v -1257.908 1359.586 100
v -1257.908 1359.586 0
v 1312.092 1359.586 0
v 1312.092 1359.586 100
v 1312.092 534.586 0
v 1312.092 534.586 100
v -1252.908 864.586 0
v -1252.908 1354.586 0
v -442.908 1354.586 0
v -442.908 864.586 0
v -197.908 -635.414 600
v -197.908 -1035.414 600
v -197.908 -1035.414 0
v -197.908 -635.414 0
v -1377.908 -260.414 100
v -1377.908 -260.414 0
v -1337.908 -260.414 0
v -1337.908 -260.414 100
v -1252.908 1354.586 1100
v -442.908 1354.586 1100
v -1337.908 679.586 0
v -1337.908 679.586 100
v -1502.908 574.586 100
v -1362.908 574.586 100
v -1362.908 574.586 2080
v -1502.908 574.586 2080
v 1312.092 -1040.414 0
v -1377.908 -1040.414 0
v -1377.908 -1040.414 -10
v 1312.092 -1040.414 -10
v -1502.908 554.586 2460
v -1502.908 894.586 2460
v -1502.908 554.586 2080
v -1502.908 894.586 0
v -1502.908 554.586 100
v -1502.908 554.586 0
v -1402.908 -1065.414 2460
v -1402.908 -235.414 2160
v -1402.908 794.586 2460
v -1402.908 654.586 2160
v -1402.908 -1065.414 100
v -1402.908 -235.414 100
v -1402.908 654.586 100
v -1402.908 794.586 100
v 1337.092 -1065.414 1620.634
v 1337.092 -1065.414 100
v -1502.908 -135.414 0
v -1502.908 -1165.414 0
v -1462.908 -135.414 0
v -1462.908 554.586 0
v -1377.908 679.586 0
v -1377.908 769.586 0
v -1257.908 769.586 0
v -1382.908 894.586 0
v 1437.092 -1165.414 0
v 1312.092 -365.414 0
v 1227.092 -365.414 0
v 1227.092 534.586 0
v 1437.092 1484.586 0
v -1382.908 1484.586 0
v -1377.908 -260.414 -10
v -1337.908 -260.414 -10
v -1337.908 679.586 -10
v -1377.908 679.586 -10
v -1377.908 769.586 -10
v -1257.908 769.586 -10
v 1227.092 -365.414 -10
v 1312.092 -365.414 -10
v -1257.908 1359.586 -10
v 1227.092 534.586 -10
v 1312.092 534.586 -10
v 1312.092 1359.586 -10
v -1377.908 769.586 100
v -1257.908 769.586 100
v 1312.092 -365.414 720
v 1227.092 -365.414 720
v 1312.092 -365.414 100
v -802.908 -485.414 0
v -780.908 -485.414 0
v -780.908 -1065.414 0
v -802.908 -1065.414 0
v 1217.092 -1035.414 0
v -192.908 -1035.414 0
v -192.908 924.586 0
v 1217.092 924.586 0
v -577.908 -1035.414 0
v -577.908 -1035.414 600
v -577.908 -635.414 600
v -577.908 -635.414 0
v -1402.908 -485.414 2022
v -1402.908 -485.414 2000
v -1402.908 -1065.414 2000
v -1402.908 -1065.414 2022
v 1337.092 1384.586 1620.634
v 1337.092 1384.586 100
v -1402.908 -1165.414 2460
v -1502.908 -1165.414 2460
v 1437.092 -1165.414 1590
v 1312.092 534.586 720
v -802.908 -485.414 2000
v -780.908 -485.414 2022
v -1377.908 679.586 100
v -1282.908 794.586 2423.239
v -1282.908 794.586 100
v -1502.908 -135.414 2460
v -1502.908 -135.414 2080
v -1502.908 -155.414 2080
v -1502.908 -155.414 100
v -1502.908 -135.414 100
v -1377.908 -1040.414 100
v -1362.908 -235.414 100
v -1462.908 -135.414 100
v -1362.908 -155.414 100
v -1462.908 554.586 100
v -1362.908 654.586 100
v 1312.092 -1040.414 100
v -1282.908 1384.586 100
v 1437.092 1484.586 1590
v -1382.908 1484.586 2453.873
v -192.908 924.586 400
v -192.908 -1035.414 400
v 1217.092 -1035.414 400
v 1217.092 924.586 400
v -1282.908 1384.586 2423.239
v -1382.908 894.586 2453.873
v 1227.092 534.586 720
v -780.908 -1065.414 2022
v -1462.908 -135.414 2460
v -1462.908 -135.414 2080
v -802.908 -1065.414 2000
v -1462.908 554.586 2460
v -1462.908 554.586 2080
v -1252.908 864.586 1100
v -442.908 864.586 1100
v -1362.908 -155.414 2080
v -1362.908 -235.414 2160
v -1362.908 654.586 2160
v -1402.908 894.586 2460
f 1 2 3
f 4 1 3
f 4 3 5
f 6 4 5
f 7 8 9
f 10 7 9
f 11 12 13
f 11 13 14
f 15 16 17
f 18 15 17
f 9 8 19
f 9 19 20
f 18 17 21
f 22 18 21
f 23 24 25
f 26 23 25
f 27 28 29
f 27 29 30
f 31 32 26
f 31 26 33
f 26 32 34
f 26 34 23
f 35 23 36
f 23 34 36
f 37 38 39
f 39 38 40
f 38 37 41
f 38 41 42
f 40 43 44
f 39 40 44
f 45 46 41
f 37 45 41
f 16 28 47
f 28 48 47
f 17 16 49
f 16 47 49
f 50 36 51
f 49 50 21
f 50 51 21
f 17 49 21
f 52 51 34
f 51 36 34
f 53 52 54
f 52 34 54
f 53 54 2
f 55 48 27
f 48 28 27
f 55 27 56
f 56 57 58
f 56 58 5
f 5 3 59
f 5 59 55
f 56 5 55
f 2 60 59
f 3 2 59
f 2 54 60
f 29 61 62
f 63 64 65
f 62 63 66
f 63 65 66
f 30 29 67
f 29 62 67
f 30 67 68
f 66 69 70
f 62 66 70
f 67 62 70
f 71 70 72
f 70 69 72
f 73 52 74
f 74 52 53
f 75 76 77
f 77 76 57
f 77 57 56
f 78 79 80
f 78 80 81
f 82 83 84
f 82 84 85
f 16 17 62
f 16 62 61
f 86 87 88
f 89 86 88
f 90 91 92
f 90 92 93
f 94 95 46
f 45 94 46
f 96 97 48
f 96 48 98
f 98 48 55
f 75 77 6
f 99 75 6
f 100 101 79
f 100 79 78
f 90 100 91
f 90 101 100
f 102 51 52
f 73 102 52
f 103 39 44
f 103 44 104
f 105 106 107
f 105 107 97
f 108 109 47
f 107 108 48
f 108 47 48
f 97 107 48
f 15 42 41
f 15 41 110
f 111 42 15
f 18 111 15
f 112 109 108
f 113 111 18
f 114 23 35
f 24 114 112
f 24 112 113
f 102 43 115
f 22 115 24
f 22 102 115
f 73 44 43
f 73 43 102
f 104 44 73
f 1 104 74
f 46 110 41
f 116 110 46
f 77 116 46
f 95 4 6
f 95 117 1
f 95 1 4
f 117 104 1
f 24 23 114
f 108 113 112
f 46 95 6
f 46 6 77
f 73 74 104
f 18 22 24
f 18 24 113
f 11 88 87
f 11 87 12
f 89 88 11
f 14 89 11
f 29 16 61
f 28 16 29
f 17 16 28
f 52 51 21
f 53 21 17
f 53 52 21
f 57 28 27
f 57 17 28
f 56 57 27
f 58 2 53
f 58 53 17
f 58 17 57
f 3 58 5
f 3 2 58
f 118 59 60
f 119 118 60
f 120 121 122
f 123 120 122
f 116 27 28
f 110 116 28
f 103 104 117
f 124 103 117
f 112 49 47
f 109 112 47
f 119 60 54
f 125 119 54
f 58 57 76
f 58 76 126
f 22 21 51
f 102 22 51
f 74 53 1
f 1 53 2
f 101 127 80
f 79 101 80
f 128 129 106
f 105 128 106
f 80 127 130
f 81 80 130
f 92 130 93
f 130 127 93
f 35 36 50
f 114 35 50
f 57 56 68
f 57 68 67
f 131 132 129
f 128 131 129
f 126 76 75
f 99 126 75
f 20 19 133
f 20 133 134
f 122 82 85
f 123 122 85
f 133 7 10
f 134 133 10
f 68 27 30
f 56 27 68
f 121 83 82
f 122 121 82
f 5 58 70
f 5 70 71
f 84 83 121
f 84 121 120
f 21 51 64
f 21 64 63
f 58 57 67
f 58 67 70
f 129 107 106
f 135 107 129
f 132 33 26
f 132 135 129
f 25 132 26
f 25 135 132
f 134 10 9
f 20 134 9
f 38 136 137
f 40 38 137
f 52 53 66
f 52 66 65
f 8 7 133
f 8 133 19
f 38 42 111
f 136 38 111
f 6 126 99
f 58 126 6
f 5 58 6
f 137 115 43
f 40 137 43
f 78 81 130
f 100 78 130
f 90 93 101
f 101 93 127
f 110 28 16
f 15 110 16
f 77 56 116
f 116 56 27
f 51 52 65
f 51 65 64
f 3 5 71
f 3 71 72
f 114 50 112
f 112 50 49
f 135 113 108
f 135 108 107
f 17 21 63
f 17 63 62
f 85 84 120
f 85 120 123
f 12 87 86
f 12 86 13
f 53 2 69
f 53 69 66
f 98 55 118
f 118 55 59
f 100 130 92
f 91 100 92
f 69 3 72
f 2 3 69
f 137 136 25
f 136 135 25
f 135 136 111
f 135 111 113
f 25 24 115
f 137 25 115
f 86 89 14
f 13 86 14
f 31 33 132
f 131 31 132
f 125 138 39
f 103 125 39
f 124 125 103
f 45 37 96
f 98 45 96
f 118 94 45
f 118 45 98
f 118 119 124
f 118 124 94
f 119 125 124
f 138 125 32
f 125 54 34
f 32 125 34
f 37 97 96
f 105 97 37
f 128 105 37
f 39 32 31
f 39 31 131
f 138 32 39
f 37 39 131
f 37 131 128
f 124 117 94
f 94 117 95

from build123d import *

# Parameters (mm, degrees)
F1_DEPTH      = 100
F2_DEPTH      = 2460
F0_W          = 85
F0_H          = 900
F3_DEPTH      = 720
F4_DEPTH      = 10
F6_DEPTH      = 1484.5868141508
F6_DEPTH_BACK = 1165.4151858492
F7_W          = 890
F7_H          = 300
F8_DEPTH      = 40
F9_W          = 730
F9_H          = 1980
F10_DEPTH     = 140.001
F12_W         = 810
F12_H         = 490
F13_DEPTH     = 1100
F12_W_2       = 1410
F12_H_2       = 1960
F14_DEPTH     = 400
F12_W_3       = 380
F12_H_3       = 400
F15_DEPTH     = 600
F17_DEPTH     = 580


with BuildPart() as f1:
    # F0 (on Top) → F1 (new body)
    with BuildSketch(Plane.XY):
        Polygon((1337.0921968033, 1384.5858141508), (-1282.9078031967, 1384.5858141508), (-1282.9078031967, 794.5858141508), (-1402.9078031967, 794.5858141508), (-1402.9078031967, 654.5858141508), (-1362.9078031967, 654.5858141508), (-1362.9078031967, -235.4141858492), (-1402.9078031967, -235.4141858492), (-1402.9078031967, -1065.4141858492), (1337.0921968033, -1065.4141858492), align=None)
        Polygon((-1377.9078031967, 769.5858141508), (-1257.9078031967, 769.5858141508), (-1257.9078031967, 1359.5858141508), (1312.0921968033, 1359.5858141508), (1312.0921968033, 534.5858141508), (1312.0921968033, -365.4141858492), (1312.0921968033, -1040.4141858492), (-1377.9078031967, -1040.4141858492), (-1377.9078031967, -260.4141858492), (-1337.9078031967, -260.4141858492), (-1337.9078031967, 679.5858141508), (-1377.9078031967, 679.5858141508), align=None, mode=Mode.SUBTRACT)
    extrude(amount=F1_DEPTH)

    # F0 (on Top) → F2 (join)
    with BuildSketch(Plane.XY):
        Polygon((-1502.9078031967, -135.4141858492), (-1502.9078031967, -1165.4141858492), (1437.0921968033, -1165.4141858492), (1437.0921968033, 1484.5858141508), (-1382.9078031967, 1484.5858141508), (-1382.9078031967, 894.5858141508), (-1502.9078031967, 894.5858141508), (-1502.9078031967, 554.5858141508), (-1462.9078031967, 554.5858141508), (-1462.9078031967, -135.4141858492), align=None)
        Polygon((-1282.9078031967, 794.5858141508), (-1282.9078031967, 1384.5858141508), (1337.0921968033, 1384.5858141508), (1337.0921968033, -1065.4141858492), (-1402.9078031967, -1065.4141858492), (-1402.9078031967, -235.4141858492), (-1362.9078031967, -235.4141858492), (-1362.9078031967, 654.5858141508), (-1402.9078031967, 654.5858141508), (-1402.9078031967, 794.5858141508), align=None, mode=Mode.SUBTRACT)
    extrude(amount=F2_DEPTH)

    # F0 (on Top) → F3 (join)
    with BuildSketch(Plane.XY):
        with Locations((1269.5921968033, 84.5858141508)):
            Rectangle(F0_W, F0_H)
    extrude(amount=F3_DEPTH)

    # F5 (on Front) → F6 (cut, two sides)
    with BuildSketch(Plane.XZ) as f6_sk:
        Polygon((1437.0921968033, 2460), (-1402.9078031967, 2460), (1437.0921968033, 1590), align=None)
    extrude(amount=-F6_DEPTH, mode=Mode.SUBTRACT)
    extrude(f6_sk.sketch, amount=F6_DEPTH_BACK, mode=Mode.SUBTRACT)

    # F7 (on face) → F8 (cut, through all)
    with BuildSketch(Plane.YZ.offset(-1362.9078031967)):
        with Locations((209.5858141508, 2310)):
            Rectangle(F7_W, F7_H)
    extrude(amount=-F8_DEPTH, mode=Mode.SUBTRACT)

    # F9 (on face) → F10 (cut, through all)
    with BuildSketch(Plane.YZ.offset(-1362.9078031967)):
        with Locations((209.5858141508, 1090)):
            Rectangle(F9_W, F9_H)
    extrude(amount=-F10_DEPTH, mode=Mode.SUBTRACT)


with BuildPart() as f4:
    # F0 (on Top) → F4 (new body)
    with BuildSketch(Plane.XY):
        Polygon((-1257.9078031967, 1359.5858141508), (-1257.9078031967, 769.5858141508), (-1377.9078031967, 769.5858141508), (-1377.9078031967, 679.5858141508), (-1337.9078031967, 679.5858141508), (-1337.9078031967, -260.4141858492), (-1377.9078031967, -260.4141858492), (-1377.9078031967, -1040.4141858492), (1312.0921968033, -1040.4141858492), (1312.0921968033, -365.4141858492), (1227.0921968033, -365.4141858492), (1227.0921968033, 534.5858141508), (1312.0921968033, 534.5858141508), (1312.0921968033, 1359.5858141508), align=None)
    extrude(amount=-F4_DEPTH)


with BuildPart() as f13:
    # F12 (on face) → F13 (new body)
    with BuildSketch(Plane.XY):
        with Locations((-847.9078031967, 1109.5858141508)):
            Rectangle(F12_W, F12_H)
    extrude(amount=F13_DEPTH)


with BuildPart() as f14:
    # F12 (on face) → F14 (new body)
    with BuildSketch(Plane.XY):
        with Locations((512.0921968033, -55.4141858492)):
            Rectangle(F12_W_2, F12_H_2)
    extrude(amount=F14_DEPTH)


with BuildPart() as f15:
    # F12 (on face) → F15 (new body)
    with BuildSketch(Plane.XY):
        with Locations((-387.9078031967, -835.4141858492)):
            Rectangle(F12_W_3, F12_H_3)
    extrude(amount=F15_DEPTH)


with BuildPart() as f17:
    # F16 (on face) → F17 (new body)
    with BuildSketch(Plane(origin=(0, -1065.4141858492, 0), x_dir=(-1, 0, 0), z_dir=(0, 1, 0))):
        Polygon((802.9078031967, 2000), (1402.9078031967, 2000), (1402.9078031967, 2022), (780.9078031967, 2022), (780.9078031967, 0), (802.9078031967, 0), align=None)
    extrude(amount=F17_DEPTH)


solid = Compound([f1.part, f4.part, f13.part, f14.part, f15.part, f17.part])
